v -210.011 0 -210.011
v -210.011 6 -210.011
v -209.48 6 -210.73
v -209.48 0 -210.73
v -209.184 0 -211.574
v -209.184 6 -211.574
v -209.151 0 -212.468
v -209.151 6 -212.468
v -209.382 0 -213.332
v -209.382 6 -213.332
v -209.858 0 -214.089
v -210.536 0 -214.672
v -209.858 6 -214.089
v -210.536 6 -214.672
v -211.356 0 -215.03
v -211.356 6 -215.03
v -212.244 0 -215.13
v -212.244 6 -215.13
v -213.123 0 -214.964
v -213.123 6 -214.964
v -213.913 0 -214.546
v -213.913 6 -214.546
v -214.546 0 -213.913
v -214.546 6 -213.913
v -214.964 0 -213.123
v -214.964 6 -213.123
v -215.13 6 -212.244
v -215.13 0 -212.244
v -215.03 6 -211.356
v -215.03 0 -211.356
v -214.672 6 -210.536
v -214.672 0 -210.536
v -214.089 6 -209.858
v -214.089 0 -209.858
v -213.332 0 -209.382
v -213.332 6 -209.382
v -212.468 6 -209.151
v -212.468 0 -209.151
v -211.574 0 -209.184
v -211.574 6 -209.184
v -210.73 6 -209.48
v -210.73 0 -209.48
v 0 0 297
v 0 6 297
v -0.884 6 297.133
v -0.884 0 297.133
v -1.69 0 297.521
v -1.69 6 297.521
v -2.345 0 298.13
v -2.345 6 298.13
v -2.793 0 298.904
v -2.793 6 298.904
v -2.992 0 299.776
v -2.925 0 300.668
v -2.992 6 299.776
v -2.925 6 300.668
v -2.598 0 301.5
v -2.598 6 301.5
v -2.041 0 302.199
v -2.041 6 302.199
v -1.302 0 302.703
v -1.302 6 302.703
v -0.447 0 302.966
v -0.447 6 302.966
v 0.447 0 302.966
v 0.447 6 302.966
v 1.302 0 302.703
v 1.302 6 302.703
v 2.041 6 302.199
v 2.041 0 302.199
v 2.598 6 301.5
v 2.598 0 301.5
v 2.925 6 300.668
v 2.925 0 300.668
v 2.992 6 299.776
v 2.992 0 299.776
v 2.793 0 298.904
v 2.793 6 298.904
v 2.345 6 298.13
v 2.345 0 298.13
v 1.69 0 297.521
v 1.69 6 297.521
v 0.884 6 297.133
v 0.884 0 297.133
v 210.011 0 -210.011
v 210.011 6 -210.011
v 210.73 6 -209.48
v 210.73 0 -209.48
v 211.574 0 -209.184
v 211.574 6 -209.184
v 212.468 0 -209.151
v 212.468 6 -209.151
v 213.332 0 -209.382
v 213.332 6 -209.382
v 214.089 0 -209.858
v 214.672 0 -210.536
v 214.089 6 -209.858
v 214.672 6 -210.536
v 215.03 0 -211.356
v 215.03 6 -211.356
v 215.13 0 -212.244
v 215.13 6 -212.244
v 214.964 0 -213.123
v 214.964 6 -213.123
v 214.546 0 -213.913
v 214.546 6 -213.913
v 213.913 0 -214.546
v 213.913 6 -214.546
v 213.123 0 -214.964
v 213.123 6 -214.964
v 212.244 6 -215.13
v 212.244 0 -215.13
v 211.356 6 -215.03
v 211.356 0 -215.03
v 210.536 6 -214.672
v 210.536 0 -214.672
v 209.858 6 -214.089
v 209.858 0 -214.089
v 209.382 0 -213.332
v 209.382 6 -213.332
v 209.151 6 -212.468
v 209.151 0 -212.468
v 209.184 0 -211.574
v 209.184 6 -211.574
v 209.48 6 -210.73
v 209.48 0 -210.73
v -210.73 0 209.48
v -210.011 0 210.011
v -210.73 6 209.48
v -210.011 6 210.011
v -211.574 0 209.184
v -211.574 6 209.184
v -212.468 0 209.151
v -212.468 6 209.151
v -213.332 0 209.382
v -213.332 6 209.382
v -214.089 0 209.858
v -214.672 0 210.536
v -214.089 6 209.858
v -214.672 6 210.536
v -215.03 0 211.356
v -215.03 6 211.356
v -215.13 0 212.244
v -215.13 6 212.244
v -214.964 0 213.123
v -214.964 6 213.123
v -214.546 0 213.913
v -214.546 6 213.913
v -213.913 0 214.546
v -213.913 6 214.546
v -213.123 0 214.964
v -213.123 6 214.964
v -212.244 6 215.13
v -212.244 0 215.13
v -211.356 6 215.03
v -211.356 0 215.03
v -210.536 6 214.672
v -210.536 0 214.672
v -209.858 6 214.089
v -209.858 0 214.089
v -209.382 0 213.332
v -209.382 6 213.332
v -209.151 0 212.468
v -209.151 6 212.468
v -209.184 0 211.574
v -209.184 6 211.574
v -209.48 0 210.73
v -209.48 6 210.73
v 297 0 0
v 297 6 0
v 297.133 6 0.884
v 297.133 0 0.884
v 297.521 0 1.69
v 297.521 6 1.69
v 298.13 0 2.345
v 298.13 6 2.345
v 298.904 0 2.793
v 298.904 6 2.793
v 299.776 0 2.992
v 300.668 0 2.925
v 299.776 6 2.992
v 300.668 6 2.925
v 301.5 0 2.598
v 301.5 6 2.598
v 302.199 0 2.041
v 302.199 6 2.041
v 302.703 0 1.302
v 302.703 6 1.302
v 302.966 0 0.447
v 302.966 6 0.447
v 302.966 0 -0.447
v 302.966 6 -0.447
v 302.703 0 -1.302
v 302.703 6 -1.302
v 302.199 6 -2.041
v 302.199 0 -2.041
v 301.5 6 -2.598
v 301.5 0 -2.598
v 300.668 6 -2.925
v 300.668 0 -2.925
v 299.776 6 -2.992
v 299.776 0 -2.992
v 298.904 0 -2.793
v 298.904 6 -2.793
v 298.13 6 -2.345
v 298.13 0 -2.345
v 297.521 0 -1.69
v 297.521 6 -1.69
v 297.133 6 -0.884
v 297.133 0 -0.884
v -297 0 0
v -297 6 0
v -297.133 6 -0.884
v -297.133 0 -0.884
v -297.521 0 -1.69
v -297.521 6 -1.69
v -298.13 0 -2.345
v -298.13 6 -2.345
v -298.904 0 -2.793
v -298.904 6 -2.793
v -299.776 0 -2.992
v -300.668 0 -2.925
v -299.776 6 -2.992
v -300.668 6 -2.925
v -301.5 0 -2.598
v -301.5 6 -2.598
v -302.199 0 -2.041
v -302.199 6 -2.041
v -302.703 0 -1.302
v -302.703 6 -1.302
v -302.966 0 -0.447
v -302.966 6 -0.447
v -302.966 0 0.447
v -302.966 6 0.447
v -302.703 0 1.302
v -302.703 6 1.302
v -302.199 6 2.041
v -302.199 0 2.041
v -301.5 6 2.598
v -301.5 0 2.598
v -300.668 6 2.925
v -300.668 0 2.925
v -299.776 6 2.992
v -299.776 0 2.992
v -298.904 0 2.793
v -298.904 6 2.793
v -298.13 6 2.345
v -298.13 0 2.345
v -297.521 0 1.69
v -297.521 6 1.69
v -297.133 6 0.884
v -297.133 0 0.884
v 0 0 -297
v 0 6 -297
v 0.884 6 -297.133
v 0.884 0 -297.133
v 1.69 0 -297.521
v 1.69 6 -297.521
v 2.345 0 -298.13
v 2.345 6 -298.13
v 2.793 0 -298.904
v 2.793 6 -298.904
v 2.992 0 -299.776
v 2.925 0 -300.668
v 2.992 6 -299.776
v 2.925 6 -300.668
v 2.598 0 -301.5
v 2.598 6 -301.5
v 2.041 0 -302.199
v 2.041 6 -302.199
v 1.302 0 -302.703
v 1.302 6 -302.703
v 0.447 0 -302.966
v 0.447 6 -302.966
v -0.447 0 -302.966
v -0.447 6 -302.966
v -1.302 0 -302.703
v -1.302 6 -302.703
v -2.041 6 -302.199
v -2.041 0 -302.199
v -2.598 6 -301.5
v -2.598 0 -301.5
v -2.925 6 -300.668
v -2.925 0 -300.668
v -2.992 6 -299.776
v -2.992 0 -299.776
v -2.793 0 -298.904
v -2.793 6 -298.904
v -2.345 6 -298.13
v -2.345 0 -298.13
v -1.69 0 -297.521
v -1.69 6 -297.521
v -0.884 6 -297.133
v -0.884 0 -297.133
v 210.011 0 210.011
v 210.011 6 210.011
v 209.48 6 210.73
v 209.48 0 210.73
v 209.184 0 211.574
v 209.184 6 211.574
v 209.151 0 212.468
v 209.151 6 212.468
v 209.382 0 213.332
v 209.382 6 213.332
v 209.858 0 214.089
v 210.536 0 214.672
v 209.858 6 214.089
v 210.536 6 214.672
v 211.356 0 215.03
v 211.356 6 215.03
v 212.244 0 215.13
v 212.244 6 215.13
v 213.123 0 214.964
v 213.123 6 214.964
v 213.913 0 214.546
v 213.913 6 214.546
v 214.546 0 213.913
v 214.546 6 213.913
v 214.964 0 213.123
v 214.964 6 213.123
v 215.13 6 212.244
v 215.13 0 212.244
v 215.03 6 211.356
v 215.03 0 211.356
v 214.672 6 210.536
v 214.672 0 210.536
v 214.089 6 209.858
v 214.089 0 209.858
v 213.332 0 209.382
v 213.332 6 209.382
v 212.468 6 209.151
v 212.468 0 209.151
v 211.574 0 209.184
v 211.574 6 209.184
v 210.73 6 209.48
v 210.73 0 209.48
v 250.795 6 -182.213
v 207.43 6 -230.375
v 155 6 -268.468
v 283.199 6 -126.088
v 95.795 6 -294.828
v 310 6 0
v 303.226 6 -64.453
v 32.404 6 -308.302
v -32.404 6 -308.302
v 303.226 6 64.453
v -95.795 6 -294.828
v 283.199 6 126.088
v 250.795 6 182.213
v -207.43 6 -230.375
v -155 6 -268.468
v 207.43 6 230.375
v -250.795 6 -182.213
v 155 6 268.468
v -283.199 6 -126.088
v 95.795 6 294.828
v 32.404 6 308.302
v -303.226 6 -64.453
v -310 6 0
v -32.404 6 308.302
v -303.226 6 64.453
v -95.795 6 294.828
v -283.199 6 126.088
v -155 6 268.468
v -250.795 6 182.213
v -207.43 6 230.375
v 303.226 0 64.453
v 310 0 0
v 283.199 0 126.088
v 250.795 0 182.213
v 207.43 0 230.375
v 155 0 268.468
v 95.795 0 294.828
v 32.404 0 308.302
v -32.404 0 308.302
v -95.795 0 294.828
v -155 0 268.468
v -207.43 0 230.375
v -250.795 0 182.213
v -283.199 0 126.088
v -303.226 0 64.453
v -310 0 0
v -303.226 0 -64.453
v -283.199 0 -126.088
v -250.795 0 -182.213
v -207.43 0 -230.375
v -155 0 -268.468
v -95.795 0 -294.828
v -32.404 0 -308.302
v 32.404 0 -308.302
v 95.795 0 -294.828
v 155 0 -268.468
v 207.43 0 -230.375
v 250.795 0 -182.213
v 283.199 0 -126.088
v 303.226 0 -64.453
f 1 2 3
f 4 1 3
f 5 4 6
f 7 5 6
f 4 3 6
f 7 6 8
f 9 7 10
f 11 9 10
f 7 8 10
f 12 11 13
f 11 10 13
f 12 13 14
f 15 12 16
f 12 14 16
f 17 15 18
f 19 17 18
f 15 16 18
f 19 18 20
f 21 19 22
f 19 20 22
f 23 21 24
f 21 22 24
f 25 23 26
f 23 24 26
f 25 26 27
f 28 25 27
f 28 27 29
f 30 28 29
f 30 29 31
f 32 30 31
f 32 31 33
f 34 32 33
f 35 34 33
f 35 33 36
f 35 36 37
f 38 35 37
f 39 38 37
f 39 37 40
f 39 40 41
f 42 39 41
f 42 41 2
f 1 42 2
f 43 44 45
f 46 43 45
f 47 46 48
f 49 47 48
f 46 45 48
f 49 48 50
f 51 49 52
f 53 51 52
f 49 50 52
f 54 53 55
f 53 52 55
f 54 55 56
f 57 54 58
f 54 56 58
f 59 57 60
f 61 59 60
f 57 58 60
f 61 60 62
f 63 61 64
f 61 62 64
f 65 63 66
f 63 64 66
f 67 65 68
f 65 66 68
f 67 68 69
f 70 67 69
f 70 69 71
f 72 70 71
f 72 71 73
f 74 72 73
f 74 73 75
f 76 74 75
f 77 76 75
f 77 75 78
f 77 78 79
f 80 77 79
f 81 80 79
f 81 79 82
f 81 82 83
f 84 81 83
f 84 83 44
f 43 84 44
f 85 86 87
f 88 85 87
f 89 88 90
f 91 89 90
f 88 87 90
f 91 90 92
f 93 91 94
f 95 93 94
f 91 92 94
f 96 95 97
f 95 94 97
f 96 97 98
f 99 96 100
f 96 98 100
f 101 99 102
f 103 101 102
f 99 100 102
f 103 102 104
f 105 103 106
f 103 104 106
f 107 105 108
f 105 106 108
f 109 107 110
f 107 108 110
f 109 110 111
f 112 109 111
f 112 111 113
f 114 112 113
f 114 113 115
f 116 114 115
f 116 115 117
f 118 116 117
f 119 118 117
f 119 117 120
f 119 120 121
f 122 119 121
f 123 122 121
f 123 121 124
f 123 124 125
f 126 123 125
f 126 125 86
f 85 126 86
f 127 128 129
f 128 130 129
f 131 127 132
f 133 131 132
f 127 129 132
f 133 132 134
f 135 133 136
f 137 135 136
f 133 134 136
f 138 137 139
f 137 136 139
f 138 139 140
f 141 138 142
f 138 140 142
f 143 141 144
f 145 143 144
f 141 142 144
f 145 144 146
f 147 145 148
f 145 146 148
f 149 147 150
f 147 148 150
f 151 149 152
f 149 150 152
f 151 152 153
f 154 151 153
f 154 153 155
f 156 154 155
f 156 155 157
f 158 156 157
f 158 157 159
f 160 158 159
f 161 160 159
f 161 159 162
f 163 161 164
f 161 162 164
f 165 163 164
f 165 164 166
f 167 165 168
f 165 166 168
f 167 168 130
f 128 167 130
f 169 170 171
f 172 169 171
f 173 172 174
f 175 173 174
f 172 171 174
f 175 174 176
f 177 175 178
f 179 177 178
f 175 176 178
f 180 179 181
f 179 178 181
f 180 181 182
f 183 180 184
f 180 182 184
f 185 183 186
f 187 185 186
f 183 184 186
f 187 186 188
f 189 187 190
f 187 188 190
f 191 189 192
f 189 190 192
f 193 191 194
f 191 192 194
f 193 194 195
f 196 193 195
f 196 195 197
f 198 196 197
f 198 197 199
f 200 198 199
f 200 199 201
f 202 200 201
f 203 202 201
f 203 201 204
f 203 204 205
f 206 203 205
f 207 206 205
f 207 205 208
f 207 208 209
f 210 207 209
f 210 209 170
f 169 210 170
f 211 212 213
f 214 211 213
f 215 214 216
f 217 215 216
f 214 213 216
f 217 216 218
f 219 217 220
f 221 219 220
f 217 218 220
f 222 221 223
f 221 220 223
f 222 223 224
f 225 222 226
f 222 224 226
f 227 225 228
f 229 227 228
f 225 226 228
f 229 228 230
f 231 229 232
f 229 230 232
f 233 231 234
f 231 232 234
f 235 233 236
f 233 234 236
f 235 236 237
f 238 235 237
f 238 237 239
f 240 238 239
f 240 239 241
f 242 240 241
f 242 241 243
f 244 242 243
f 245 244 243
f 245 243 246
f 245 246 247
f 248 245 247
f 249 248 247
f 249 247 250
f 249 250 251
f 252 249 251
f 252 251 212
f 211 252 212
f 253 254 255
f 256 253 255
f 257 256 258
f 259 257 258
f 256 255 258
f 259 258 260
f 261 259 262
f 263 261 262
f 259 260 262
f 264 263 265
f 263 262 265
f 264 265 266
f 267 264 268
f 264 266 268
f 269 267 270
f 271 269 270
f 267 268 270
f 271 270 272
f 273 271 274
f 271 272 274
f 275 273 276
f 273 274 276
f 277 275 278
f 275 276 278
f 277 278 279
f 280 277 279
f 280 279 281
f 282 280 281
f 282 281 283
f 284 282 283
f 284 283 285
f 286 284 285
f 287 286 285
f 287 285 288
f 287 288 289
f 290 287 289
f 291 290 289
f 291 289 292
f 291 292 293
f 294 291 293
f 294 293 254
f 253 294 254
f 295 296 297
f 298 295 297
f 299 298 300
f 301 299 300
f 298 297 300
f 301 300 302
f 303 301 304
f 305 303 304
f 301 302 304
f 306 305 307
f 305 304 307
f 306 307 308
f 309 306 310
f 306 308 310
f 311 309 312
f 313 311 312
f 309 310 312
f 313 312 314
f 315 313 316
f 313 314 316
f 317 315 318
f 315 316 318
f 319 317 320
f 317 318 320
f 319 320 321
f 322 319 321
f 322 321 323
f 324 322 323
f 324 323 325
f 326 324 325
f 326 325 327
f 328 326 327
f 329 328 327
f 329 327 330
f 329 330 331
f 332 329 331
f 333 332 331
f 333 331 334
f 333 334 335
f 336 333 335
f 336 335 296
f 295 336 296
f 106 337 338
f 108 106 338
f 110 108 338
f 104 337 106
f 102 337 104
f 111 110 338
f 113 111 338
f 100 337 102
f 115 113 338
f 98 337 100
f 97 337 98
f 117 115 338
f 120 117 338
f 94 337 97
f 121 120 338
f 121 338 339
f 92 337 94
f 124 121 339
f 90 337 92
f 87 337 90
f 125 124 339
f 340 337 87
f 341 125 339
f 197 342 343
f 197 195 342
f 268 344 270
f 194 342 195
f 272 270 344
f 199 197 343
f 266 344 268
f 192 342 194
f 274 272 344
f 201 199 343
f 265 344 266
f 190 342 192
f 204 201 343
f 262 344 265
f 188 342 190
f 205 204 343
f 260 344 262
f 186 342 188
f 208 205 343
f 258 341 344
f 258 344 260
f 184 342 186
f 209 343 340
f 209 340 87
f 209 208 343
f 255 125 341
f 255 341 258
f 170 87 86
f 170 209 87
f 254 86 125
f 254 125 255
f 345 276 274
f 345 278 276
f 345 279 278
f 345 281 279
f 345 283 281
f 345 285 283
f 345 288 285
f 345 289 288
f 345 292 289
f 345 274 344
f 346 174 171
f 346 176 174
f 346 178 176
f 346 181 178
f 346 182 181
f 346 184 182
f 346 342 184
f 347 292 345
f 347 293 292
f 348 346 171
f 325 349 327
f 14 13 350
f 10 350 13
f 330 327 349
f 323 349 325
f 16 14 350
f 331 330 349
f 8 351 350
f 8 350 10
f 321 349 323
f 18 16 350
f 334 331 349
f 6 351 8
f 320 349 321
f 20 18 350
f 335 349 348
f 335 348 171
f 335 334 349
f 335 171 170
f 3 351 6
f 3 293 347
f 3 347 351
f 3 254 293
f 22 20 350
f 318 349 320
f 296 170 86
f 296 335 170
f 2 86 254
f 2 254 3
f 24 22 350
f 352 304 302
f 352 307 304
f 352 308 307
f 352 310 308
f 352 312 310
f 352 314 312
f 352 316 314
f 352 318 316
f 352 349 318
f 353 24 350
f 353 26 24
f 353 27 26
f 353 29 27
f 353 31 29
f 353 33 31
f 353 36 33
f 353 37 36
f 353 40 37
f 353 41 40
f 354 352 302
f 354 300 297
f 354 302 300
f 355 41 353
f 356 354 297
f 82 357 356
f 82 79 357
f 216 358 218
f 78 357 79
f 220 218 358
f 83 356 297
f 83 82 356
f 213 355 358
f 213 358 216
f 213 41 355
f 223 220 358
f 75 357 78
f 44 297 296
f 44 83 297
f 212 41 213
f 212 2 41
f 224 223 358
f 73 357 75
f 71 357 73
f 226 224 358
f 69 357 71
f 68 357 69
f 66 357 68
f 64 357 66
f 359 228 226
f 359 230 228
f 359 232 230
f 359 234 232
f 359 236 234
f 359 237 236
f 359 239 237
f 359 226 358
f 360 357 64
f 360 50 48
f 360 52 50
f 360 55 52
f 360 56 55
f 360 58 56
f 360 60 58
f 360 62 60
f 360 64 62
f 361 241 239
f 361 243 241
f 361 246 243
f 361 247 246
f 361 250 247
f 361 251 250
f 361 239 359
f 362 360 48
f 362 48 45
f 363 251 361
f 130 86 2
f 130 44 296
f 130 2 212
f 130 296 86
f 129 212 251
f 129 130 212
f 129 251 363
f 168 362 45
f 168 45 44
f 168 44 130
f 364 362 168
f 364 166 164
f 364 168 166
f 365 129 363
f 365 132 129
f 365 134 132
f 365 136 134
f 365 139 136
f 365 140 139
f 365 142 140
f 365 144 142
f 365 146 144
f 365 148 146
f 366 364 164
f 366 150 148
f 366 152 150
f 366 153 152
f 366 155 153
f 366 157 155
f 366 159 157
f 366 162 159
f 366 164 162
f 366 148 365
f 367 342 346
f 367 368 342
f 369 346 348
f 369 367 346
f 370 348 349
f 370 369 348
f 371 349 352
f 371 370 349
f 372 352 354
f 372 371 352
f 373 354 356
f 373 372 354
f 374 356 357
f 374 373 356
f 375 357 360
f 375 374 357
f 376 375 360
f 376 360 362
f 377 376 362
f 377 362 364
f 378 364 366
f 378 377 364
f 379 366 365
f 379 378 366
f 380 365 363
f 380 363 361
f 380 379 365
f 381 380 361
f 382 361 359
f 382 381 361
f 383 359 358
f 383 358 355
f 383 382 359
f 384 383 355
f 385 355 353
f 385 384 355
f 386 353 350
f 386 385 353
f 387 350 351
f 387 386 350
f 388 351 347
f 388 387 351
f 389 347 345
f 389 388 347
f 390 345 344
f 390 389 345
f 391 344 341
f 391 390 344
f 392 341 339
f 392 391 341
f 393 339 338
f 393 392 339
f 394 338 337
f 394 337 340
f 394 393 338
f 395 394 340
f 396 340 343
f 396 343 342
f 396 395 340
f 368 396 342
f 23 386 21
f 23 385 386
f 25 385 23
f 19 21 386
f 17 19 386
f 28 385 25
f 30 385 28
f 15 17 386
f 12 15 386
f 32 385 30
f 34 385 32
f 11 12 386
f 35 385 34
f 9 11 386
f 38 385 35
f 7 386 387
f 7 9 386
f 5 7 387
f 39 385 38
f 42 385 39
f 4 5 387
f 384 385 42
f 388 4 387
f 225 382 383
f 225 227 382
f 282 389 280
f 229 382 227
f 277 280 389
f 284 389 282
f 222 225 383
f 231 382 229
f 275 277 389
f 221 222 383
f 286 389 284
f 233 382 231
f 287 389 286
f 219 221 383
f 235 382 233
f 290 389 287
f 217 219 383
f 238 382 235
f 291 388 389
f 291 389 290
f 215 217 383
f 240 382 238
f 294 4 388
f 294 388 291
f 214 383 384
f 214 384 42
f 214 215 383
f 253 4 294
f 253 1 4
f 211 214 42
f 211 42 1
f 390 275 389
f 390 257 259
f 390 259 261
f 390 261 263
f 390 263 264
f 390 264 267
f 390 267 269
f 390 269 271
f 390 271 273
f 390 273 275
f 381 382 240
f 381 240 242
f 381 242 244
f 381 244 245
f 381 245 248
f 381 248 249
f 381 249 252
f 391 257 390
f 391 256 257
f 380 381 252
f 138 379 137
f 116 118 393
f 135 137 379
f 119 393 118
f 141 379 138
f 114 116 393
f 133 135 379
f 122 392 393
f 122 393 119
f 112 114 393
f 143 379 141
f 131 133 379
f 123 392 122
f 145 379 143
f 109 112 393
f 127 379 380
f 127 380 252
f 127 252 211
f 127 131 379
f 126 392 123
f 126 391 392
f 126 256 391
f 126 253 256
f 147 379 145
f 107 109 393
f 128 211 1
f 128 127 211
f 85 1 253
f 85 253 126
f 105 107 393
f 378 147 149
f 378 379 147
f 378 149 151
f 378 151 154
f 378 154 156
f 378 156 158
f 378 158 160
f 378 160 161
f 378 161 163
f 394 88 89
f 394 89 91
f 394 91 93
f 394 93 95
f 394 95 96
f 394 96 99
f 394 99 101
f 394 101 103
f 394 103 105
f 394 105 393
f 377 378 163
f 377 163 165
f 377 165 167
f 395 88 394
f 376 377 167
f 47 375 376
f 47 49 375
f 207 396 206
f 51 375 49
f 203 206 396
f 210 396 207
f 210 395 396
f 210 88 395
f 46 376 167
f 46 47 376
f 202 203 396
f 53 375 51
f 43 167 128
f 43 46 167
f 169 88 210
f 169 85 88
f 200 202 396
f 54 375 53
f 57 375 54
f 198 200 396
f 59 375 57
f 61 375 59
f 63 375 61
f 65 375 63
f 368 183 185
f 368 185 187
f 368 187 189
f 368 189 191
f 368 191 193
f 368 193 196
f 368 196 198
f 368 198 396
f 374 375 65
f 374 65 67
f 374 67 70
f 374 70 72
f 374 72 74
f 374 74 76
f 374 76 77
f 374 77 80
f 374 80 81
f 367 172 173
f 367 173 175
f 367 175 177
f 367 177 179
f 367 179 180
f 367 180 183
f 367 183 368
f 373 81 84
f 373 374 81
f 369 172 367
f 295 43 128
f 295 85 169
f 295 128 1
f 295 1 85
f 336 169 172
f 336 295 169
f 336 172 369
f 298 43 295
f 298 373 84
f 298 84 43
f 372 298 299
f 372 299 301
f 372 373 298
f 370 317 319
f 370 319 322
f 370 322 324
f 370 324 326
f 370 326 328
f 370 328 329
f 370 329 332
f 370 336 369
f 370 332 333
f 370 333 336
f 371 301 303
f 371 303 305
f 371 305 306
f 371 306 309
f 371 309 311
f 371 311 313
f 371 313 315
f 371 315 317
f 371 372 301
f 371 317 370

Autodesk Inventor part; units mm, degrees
ref_plane "YZ Plane" through (0, 0, 0) normal (1, 0, 0) x (0, 1, 0)
ref_plane "XZ Plane" through (0, 0, 0) normal (0, 1, 0) x (-1, 0, 0)
ref_plane "XY Plane" through (0, 0, 0) normal (0, 0, 1) x (1, 0, 0)
sketch "Sketch1" plane through (0, 0, 0) normal (0, 1, 0) x (-1, 0, 0)
  line L0 (-500, 500) -> (500, 500)
  line L1 (500, 500) -> (500, -500)
  line L2 (500, -500) -> (-500, -500)
  line L3 (-500, -500) -> (-500, 500)
  line L4 (-500, 500) -> (500, -500) construction
  line L5 (500, 500) -> (-500, -500) construction
  point P0 (0, 0)
  dimension "d0" = 1000
  dimension "d1" = 1000
extrude "Extrusion1" add sketch "Sketch1" along normal blind 6
sketch "Sketch2" plane through (0, 0, 0) normal (0, -1, 0) x (1, 0, 0)
  circle A0 centre (0, 0) radius 310
  dimension "d4" = 620
extrude "Extrusion2" cut sketch "Sketch2" against normal blind 10 keep common part
sketch "Sketch3" plane through (0, 0, 0) normal (0, -1, 0) x (1, 0, 0)
  circle A0 centre (0, 0) radius 300 construction
  line L0 (0, -434) -> (0, 434) construction
  point P0 (0, 300)
  dimension "d7" = 600
hole "Hole1" at (0, 0, 300) direction (0, 1, 0) diameter 6 end through all
pattern_circular "Circular Pattern1" count 8 over 360 about axis through (0, 0, 0) along (0, 1, 0) of "Hole1"
properties part number "płyta 6 biala okragla R600"
